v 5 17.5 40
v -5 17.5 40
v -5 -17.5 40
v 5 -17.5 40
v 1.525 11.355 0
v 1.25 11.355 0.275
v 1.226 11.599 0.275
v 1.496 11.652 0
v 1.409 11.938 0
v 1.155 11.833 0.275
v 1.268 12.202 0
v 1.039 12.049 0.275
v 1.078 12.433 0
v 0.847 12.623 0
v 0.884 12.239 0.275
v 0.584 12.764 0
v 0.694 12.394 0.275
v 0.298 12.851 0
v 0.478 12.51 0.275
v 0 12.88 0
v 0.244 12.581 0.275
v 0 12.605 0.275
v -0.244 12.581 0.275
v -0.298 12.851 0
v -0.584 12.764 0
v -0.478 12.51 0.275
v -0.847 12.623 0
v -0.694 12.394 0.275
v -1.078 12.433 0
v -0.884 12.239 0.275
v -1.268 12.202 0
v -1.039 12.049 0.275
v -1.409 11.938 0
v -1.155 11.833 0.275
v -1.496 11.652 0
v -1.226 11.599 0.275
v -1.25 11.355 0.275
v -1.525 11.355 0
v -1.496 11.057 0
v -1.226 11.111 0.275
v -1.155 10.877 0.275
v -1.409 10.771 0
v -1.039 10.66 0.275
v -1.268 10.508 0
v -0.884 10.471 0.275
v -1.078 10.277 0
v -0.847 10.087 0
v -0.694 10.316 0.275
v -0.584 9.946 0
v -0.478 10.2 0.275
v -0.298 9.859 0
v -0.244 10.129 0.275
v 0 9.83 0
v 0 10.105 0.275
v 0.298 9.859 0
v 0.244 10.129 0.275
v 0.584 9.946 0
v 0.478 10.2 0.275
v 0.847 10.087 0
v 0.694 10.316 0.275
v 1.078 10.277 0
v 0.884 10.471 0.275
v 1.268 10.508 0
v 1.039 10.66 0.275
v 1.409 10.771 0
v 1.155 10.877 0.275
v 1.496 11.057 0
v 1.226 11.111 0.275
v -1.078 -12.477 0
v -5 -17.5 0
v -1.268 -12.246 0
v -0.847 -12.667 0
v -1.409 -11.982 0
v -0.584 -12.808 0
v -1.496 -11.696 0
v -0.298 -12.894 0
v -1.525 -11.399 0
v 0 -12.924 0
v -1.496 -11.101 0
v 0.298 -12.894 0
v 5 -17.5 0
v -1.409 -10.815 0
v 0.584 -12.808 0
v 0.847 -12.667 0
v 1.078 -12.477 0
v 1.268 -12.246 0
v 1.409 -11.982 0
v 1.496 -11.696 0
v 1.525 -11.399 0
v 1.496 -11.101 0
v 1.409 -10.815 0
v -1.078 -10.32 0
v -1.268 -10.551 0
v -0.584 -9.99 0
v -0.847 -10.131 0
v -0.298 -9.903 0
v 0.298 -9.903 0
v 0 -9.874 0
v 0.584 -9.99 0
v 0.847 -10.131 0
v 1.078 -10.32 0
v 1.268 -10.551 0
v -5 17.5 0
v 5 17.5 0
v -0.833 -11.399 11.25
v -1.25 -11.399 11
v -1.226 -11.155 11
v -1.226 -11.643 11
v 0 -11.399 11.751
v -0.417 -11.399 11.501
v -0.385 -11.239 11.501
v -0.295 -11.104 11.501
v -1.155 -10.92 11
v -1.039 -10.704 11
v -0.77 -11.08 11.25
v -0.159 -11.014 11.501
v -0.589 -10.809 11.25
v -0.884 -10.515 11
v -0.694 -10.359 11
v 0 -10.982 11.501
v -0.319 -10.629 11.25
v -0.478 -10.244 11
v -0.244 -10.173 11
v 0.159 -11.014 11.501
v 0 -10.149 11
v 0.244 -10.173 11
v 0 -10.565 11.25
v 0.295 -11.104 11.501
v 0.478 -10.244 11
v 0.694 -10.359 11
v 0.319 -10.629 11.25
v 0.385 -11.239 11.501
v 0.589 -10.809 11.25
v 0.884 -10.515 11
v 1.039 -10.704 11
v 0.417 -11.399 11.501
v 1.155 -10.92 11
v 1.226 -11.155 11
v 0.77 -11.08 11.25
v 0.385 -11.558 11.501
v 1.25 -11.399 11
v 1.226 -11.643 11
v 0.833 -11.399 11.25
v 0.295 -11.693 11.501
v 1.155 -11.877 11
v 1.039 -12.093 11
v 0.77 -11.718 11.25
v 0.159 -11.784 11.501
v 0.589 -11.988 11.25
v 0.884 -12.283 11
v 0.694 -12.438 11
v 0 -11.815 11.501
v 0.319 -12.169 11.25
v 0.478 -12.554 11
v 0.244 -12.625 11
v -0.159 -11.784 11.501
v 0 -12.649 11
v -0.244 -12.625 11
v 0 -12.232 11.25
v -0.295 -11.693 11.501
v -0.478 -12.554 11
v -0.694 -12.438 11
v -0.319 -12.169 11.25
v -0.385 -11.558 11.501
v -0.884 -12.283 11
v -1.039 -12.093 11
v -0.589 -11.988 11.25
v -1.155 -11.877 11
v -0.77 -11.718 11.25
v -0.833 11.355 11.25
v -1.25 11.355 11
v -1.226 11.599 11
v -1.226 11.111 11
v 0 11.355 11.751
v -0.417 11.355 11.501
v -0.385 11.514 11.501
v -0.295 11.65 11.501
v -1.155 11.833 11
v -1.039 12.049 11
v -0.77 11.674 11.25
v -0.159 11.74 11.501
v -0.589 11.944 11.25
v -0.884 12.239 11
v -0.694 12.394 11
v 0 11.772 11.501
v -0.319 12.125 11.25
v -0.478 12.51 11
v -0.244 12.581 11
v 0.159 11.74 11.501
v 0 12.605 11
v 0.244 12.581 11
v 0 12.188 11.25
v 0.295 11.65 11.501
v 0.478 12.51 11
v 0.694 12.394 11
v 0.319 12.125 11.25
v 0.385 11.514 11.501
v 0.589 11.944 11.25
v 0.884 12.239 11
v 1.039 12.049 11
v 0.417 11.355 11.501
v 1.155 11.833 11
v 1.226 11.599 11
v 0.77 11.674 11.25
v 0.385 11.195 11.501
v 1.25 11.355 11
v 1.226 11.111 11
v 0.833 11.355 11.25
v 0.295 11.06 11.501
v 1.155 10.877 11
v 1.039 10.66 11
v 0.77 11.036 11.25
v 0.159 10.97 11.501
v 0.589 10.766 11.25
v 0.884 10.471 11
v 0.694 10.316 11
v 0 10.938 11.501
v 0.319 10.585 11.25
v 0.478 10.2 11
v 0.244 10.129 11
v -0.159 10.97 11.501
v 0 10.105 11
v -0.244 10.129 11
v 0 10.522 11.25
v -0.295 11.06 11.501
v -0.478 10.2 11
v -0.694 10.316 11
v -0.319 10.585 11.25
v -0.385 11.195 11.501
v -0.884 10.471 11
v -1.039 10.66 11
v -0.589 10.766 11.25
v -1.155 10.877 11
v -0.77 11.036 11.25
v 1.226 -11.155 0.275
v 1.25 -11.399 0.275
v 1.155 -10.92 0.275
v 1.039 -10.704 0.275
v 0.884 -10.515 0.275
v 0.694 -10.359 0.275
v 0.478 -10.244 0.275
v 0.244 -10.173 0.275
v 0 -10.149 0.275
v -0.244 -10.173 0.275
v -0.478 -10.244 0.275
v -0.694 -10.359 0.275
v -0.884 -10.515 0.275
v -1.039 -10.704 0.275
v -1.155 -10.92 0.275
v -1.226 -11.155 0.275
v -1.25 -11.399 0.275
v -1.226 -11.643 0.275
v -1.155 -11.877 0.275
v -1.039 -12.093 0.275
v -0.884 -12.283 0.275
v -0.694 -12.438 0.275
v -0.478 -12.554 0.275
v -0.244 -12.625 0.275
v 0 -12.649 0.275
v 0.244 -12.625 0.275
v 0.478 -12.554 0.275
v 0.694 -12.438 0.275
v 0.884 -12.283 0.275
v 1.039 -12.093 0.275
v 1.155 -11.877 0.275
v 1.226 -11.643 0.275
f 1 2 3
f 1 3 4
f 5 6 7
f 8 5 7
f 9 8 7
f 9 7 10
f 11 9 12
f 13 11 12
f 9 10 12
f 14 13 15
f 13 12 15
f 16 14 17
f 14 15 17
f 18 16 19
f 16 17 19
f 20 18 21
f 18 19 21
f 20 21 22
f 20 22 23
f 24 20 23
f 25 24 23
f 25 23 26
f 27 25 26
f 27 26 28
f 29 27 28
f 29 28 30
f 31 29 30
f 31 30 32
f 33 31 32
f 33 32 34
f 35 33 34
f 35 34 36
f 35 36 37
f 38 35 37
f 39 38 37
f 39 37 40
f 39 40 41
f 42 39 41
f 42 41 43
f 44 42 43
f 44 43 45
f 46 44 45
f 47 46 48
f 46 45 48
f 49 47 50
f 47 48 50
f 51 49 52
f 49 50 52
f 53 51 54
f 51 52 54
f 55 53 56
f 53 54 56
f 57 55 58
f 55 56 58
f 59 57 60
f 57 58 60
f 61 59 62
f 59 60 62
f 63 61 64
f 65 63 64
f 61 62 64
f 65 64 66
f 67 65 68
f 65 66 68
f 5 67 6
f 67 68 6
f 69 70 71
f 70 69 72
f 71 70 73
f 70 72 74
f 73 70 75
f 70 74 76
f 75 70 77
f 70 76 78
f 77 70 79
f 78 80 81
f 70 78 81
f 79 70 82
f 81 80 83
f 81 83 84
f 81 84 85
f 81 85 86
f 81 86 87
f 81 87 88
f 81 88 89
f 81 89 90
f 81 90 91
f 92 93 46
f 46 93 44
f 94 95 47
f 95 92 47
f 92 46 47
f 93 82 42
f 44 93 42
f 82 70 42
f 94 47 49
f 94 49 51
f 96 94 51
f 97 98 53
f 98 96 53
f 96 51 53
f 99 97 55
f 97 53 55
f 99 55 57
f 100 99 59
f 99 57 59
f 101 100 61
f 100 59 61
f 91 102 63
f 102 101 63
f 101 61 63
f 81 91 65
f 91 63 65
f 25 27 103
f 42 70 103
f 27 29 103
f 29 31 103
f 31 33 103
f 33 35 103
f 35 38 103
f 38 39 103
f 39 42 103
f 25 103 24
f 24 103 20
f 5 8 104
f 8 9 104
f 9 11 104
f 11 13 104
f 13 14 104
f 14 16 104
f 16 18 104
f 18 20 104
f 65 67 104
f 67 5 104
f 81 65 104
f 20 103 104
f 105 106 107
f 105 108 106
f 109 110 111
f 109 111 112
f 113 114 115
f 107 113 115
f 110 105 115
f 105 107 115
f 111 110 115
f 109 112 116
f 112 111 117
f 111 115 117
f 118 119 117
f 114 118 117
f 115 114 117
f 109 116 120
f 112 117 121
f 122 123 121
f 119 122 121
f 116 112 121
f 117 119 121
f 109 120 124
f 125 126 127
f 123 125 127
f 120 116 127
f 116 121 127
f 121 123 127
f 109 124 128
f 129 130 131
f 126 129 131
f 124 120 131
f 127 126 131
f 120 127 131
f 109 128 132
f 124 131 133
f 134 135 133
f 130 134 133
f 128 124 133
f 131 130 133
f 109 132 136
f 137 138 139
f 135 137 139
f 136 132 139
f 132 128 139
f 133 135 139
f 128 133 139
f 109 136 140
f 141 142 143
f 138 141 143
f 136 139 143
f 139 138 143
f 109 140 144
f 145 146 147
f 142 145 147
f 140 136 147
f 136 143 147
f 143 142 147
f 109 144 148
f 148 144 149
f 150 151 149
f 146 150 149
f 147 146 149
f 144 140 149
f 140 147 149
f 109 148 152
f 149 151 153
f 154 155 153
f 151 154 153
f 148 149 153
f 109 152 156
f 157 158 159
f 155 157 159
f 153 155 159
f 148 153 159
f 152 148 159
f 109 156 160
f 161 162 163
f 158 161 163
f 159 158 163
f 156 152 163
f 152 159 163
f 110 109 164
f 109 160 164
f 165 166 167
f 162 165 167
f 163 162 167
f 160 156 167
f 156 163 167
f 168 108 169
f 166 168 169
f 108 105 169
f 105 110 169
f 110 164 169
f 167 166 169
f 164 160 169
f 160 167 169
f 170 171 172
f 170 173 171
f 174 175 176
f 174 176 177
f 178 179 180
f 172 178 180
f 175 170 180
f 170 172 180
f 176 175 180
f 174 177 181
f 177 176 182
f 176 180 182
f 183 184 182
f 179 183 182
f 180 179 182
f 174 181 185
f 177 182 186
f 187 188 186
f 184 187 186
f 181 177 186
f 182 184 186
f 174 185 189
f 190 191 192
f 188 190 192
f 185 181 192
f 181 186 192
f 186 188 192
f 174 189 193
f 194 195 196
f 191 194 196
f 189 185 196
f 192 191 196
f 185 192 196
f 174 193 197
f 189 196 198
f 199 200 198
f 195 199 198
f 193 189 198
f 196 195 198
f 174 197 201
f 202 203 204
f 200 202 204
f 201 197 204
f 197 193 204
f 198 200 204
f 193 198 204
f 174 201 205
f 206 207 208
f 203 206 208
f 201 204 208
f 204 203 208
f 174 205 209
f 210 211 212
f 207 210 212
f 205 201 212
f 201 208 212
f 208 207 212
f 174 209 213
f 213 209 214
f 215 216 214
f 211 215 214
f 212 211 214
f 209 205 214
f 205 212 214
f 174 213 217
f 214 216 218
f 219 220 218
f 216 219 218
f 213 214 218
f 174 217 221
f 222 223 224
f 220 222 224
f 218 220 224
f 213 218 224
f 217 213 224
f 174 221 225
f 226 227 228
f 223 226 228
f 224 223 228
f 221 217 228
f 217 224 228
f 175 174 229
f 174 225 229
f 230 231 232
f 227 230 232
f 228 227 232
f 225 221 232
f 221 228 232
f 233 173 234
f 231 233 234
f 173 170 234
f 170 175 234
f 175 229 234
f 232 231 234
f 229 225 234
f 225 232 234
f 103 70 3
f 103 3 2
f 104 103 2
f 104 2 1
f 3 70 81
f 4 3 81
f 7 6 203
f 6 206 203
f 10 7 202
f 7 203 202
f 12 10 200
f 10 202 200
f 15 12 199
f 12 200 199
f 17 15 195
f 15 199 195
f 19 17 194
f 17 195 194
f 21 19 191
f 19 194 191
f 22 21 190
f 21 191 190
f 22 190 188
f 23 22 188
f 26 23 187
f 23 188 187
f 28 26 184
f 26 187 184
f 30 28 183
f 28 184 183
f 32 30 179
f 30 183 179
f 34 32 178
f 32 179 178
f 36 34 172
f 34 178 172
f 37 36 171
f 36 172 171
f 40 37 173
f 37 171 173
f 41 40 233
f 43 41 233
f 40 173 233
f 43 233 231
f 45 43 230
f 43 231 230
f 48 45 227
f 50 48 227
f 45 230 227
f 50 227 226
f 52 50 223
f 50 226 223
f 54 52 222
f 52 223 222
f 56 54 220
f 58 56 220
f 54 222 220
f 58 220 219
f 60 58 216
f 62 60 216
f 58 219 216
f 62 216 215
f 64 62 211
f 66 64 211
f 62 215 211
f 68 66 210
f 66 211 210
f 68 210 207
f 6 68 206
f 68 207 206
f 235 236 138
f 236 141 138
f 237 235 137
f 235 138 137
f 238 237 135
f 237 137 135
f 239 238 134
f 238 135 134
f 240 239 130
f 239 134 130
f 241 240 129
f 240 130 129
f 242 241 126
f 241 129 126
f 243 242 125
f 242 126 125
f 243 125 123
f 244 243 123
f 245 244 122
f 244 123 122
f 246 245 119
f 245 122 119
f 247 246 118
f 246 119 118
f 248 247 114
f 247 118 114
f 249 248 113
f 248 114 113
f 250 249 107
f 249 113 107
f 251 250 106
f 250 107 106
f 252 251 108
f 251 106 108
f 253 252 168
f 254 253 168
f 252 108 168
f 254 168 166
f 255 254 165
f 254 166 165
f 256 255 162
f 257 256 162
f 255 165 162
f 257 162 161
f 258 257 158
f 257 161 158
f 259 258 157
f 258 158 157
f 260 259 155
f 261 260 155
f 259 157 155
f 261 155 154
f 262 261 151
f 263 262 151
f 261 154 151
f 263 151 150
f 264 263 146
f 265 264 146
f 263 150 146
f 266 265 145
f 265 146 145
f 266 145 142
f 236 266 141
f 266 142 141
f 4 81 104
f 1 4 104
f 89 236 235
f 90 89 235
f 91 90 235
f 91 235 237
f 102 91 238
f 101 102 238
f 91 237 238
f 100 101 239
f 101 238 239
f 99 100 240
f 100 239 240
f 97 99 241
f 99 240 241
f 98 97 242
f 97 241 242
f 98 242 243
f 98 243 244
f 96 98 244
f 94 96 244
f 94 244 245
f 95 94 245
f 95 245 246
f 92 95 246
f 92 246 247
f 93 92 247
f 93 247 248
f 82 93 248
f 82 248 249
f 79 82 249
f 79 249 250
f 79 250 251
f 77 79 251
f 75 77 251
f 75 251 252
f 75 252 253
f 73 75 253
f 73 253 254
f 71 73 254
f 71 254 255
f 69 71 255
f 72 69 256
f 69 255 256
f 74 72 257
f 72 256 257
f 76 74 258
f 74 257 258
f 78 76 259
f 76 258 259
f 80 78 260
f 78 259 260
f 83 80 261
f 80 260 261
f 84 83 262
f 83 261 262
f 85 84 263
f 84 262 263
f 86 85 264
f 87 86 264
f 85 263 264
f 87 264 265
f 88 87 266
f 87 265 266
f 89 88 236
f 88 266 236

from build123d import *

# Parameters (mm, degrees)
SKETCH1_W                       = 10
SKETCH1_H                       = 35
BOSS_EXTRUDE1_DEPTH             = 40
M3X0_5_TAPPED_HOLE1_D           = 2.5
M3X0_5_TAPPED_HOLE1_DEPTH       = 11
M3X0_5_TAPPED_HOLE1_CSINK_D     = 3.05
M3X0_5_TAPPED_HOLE1_CSINK_ANGLE = 90
M3X0_5_TAPPED_HOLE1_TIP         = 0.751075774


with BuildPart() as part:
    # Sketch1 → Boss-Extrude1 (new body)
    with BuildSketch(Plane.XY):
        Rectangle(SKETCH1_W, SKETCH1_H)
    extrude(amount=BOSS_EXTRUDE1_DEPTH)

    # M3x0.5 Tapped Hole1
    with Locations(Plane(origin=(0, 0, 0), x_dir=(-1, 0, 0), z_dir=(0, 0, -1))):
        with Locations((0, 11.354900128), (0, -11.398741441)):
            CounterSinkHole(M3X0_5_TAPPED_HOLE1_D / 2, M3X0_5_TAPPED_HOLE1_CSINK_D / 2, depth=M3X0_5_TAPPED_HOLE1_DEPTH, counter_sink_angle=M3X0_5_TAPPED_HOLE1_CSINK_ANGLE)
            with Locations((0, 0, -(M3X0_5_TAPPED_HOLE1_DEPTH + M3X0_5_TAPPED_HOLE1_TIP / 2))):  # 118° drill point
                Cone(0, M3X0_5_TAPPED_HOLE1_D / 2, M3X0_5_TAPPED_HOLE1_TIP, mode=Mode.SUBTRACT)


solid = part.part
